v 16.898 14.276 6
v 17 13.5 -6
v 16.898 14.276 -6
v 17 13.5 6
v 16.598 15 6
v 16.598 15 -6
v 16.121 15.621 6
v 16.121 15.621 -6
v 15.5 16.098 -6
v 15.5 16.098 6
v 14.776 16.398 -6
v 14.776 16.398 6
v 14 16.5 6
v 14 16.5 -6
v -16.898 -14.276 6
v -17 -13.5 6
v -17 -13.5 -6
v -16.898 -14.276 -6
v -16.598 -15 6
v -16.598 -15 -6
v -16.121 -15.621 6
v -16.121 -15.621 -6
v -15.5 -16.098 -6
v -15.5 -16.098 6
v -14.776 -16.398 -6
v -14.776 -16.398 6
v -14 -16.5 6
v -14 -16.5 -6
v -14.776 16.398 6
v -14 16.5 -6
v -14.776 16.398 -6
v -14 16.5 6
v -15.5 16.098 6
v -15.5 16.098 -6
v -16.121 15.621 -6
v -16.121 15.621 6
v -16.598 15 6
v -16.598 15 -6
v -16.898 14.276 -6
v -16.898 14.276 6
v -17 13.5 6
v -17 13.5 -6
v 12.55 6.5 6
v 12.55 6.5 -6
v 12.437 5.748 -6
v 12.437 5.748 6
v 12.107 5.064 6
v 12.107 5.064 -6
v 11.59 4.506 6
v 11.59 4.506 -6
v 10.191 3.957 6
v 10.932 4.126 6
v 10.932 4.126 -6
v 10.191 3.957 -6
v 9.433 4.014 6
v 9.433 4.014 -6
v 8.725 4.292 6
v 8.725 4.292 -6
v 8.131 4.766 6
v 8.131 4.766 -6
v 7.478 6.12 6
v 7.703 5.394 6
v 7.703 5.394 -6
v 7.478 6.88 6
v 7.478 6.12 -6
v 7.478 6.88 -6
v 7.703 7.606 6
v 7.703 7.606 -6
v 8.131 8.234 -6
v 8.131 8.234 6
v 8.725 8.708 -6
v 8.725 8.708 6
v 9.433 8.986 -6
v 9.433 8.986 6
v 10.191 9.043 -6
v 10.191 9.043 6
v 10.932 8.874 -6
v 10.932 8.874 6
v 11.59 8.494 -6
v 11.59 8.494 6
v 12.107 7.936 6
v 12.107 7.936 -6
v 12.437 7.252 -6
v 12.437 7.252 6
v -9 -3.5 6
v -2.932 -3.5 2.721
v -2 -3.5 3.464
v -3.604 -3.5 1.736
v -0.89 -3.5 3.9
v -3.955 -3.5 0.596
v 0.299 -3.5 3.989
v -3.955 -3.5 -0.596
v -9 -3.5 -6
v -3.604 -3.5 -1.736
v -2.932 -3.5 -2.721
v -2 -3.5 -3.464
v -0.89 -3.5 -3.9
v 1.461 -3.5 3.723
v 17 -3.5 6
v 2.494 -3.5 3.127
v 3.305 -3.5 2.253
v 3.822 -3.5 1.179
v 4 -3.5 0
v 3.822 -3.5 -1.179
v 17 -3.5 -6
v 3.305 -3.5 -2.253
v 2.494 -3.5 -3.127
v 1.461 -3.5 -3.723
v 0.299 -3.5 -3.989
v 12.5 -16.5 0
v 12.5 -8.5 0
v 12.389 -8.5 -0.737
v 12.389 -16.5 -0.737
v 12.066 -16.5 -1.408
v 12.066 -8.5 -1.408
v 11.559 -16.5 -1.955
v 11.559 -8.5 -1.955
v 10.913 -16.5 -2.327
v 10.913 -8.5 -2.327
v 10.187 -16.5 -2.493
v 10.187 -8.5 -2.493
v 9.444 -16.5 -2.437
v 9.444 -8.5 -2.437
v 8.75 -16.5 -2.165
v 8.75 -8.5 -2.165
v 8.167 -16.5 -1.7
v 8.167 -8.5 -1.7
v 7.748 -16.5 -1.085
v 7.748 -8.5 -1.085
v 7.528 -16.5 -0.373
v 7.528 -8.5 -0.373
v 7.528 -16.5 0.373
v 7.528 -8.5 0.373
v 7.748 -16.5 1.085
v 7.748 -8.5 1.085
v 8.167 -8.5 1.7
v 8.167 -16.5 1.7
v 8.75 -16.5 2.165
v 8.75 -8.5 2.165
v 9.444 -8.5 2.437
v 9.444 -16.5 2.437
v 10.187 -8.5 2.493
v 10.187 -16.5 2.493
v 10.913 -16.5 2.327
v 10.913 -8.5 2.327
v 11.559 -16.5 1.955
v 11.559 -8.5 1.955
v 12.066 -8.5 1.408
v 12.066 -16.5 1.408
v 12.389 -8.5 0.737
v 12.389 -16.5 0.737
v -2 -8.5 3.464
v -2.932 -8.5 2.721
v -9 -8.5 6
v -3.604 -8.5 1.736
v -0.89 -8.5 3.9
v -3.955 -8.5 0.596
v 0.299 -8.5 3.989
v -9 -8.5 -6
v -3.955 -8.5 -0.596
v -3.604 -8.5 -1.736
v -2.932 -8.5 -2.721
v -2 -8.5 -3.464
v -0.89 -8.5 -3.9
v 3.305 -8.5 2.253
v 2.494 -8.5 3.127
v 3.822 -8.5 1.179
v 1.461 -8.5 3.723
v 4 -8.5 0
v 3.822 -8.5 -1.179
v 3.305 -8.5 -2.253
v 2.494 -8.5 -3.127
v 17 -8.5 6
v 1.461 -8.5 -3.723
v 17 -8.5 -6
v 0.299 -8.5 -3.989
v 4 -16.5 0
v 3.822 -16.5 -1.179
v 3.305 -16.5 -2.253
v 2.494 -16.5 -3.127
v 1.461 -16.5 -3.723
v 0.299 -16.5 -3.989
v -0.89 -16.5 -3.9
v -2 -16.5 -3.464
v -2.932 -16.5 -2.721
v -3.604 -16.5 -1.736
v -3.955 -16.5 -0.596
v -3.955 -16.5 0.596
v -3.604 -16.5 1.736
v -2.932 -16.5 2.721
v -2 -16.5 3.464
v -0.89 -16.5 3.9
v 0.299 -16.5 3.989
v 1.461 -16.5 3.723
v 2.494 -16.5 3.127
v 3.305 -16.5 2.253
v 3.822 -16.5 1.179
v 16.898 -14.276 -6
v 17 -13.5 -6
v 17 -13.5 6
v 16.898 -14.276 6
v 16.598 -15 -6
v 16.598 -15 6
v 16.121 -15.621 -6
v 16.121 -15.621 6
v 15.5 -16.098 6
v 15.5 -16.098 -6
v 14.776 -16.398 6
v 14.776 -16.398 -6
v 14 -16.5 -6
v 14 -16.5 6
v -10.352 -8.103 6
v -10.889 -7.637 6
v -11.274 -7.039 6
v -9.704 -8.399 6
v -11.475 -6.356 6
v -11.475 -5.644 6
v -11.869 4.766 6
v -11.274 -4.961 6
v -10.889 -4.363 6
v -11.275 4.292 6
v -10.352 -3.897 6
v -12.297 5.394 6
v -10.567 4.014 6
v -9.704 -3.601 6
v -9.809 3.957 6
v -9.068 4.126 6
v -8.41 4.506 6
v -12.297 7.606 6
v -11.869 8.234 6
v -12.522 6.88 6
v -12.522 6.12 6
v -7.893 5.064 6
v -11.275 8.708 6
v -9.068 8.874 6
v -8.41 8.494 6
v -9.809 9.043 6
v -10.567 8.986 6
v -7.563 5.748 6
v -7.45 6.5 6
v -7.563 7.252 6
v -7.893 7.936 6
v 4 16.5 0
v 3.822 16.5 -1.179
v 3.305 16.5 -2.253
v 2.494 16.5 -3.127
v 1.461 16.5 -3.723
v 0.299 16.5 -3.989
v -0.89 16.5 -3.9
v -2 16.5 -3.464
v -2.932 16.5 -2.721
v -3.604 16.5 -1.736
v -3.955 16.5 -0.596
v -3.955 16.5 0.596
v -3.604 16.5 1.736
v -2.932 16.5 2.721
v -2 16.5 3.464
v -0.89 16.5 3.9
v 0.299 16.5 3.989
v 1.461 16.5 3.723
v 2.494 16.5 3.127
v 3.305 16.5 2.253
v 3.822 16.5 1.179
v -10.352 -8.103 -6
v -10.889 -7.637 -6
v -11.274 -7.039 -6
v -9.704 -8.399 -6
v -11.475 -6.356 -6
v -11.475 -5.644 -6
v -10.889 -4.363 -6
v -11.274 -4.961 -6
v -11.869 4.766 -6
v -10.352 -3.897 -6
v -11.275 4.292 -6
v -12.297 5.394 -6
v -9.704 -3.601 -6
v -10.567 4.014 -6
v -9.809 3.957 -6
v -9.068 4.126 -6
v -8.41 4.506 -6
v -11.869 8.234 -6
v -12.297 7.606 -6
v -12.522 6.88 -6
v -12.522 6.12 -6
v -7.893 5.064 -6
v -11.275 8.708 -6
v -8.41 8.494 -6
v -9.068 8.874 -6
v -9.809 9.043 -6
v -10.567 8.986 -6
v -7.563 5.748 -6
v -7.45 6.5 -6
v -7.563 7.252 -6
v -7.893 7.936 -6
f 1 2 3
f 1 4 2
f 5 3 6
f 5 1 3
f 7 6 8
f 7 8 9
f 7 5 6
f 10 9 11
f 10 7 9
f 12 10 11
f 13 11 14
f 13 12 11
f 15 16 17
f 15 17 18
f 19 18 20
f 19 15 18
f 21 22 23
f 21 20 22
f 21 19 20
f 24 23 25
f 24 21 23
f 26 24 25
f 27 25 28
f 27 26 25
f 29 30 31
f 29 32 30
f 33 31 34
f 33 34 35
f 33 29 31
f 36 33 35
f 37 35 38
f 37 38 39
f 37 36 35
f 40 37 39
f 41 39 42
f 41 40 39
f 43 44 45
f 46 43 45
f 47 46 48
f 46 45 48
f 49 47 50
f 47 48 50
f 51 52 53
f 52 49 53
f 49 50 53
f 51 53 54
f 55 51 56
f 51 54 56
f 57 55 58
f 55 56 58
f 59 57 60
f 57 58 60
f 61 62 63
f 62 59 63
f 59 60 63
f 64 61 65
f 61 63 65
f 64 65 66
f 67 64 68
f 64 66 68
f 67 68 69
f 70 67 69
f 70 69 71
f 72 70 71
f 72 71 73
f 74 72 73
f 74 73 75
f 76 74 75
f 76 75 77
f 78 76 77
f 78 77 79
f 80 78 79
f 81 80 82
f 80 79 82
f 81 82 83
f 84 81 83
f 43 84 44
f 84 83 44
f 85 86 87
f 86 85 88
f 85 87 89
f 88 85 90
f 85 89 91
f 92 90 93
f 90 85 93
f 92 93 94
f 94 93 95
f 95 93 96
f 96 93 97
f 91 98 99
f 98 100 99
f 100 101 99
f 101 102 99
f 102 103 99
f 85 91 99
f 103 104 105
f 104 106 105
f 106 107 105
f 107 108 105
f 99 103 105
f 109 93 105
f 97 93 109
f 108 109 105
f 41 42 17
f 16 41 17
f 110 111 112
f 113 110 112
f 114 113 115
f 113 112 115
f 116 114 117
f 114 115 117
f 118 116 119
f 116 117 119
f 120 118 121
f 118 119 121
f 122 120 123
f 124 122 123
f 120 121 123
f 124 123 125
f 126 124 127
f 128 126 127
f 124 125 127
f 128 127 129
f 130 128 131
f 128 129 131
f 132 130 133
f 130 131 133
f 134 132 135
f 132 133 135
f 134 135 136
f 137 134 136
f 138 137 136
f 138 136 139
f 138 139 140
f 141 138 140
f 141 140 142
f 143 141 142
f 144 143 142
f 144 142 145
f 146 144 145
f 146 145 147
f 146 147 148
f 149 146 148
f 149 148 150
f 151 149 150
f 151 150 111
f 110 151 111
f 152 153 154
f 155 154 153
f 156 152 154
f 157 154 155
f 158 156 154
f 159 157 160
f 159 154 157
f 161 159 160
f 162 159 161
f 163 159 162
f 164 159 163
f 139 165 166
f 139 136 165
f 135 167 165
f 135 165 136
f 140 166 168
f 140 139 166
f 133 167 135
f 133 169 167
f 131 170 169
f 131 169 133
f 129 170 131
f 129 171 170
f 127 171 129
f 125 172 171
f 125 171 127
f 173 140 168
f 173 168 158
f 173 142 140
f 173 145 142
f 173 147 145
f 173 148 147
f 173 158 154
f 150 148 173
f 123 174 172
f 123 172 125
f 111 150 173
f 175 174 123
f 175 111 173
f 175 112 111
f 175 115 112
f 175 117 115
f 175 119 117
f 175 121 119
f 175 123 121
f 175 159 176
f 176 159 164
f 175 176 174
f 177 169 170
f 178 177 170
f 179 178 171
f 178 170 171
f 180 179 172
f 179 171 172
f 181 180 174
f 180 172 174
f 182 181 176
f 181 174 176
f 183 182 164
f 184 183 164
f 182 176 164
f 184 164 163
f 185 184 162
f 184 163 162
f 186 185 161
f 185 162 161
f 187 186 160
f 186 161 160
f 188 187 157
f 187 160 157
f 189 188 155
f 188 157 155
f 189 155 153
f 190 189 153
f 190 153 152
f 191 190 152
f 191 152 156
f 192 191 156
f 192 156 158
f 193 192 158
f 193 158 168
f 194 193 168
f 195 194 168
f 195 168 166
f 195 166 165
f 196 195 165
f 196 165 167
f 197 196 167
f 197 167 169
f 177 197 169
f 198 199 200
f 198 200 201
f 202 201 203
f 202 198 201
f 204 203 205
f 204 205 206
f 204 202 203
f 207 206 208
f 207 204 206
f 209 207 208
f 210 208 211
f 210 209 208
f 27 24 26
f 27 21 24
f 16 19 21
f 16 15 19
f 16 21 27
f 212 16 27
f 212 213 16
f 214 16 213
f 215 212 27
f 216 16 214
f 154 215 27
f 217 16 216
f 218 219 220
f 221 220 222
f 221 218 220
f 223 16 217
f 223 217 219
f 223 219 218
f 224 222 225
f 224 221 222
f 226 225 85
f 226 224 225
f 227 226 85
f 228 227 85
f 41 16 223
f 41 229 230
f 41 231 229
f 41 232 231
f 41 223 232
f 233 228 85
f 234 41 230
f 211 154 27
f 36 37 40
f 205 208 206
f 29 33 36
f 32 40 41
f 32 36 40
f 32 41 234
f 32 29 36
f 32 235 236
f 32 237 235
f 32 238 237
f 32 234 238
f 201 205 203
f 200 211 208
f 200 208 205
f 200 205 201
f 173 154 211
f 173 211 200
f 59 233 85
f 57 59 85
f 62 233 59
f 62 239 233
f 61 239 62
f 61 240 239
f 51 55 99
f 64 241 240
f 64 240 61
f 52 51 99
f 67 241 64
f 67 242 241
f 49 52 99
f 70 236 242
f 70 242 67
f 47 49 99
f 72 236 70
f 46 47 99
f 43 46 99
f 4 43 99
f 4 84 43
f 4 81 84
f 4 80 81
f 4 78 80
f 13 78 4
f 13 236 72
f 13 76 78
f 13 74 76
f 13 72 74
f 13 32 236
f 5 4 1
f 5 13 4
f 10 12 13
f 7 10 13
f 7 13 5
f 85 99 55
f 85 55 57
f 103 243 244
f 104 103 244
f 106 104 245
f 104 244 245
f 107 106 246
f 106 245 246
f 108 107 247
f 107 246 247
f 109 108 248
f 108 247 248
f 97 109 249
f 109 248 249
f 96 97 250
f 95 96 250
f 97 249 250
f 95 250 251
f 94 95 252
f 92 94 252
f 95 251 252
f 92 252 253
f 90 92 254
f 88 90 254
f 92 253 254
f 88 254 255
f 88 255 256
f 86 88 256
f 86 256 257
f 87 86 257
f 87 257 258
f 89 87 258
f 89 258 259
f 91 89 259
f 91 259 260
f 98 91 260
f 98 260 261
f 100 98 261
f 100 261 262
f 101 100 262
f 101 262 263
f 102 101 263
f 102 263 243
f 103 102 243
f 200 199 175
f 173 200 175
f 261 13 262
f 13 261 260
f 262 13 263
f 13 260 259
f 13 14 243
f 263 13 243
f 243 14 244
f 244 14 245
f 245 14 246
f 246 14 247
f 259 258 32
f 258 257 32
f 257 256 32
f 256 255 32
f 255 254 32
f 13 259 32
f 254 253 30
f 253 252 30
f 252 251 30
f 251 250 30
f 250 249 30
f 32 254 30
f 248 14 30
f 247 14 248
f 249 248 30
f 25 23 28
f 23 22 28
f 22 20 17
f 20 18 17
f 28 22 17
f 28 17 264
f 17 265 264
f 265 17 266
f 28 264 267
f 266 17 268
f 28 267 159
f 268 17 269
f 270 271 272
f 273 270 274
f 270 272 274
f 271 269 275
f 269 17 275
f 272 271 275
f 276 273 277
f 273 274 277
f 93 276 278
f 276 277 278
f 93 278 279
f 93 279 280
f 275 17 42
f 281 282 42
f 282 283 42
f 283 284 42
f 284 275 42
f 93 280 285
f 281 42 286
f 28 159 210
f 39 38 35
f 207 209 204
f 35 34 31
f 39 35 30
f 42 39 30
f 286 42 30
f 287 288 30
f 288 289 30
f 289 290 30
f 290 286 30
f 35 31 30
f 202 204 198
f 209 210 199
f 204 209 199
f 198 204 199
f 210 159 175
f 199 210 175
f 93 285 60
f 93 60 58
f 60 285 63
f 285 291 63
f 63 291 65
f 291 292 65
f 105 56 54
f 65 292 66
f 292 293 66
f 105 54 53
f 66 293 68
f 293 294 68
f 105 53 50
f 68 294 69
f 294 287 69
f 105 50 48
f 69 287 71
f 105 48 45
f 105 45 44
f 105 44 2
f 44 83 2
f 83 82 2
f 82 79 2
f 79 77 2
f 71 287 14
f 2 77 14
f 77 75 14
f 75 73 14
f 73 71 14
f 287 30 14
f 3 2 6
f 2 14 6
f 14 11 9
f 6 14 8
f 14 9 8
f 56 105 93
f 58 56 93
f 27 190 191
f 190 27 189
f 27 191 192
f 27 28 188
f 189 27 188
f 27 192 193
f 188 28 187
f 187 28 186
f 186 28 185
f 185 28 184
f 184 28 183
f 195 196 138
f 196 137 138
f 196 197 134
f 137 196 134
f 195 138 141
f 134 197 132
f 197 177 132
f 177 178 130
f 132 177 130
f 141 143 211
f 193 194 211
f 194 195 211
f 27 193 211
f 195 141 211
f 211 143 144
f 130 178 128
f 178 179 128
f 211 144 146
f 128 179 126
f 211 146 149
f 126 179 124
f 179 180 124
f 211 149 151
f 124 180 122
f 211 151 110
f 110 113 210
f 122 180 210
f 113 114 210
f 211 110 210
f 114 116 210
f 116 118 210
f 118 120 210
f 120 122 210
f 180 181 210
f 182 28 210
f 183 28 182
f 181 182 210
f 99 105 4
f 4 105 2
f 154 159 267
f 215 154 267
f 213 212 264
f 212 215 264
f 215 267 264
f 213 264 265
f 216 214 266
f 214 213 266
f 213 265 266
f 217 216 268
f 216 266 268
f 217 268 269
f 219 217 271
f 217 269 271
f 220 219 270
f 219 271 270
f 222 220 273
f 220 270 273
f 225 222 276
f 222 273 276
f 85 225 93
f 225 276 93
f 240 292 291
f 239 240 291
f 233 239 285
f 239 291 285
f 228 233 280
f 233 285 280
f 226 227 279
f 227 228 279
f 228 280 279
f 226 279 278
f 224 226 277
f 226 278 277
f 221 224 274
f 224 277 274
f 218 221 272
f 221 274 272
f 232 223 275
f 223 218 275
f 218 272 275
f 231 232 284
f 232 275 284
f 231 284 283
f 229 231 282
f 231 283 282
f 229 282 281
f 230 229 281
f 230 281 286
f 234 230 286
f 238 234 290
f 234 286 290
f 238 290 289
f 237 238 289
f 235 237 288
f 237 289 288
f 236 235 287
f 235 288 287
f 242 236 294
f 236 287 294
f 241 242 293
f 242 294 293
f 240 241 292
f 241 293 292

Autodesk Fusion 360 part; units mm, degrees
sketch "Sketch1" plane through (0, 0, 0) normal (0, 0, 1) x (1, 0, 0) in component "TR8x2_Nut"
  line L0 (17, 16.5) -> (-17, 16.5)
  line L1 (-17, 16.5) -> (-17, -16.5)
  line L2 (-17, -16.5) -> (17, -16.5)
  line L3 (17, -16.5) -> (17, 16.5)
  line L4 (17, 16.5) -> (-17, -16.5) construction
  line L5 (-17, 16.5) -> (17, -16.5) construction
  line L6 (-9, -8.5) -> (17, -8.5)
  line L7 (-9, -3.5) -> (17, -3.5)
  line L8 (-17, 6.5) -> (17, 6.5) construction
  line L9 (-9, -8.5) -> (-9, -3.5) construction
  arc A0 (-9, -3.5) -> (-9, -8.5) centre (-9, -6) ccw
  circle A1 centre (-10, 6.5) radius 2.55
  line L10 (0, 0) -> (0, 16.5) construction
  circle A2 centre (10, 6.5) radius 2.55
  dimension "d1" = 34
  dimension "d2" = 33
  dimension "d7" = 26
  dimension "d8" = 5.1
  dimension "d9" = 7
  dimension "d10" = 10
  dimension "d11" = 20
  dimension "d12" = 5
extrude "Extrude1" add sketch "Sketch1" along normal mid plane 12 contours L0 L1 L2 L3 L6 L7 A0 in component "TR8x2_Nut"
sketch "Sketch2" plane through (0, 0, 0) normal (0, 1, 0) x (1, 0, 0) in component "TR8x2_Nut"
  circle A0 centre (0, 0) radius 4
  circle A1 centre (10, 0) radius 2.5
  dimension "d15" = 8
  dimension "d16" = 5
  dimension "d17" = 10
extrude "Extrude2" cut sketch "Sketch2" against normal blind 12.9576 from surface at -8.5 contours A1 in component "TR8x2_Nut"
extrude "Extrude3" cut sketch "Sketch2" along normal mid plane 84.5817 contours A0 in component "TR8x2_Nut"
fillet "Fillet1" radius 3 4 edges at (-17, -16.5, 0) (17, -16.5, 0) (17, 16.5, 0) (-17, 16.5, 0) in component "TR8x2_Nut"
component "TR8x2_Nut" placed x (1, 0, 0) y (0, 1, 0) z (0, 0, 1) at (0, 0, 0)
